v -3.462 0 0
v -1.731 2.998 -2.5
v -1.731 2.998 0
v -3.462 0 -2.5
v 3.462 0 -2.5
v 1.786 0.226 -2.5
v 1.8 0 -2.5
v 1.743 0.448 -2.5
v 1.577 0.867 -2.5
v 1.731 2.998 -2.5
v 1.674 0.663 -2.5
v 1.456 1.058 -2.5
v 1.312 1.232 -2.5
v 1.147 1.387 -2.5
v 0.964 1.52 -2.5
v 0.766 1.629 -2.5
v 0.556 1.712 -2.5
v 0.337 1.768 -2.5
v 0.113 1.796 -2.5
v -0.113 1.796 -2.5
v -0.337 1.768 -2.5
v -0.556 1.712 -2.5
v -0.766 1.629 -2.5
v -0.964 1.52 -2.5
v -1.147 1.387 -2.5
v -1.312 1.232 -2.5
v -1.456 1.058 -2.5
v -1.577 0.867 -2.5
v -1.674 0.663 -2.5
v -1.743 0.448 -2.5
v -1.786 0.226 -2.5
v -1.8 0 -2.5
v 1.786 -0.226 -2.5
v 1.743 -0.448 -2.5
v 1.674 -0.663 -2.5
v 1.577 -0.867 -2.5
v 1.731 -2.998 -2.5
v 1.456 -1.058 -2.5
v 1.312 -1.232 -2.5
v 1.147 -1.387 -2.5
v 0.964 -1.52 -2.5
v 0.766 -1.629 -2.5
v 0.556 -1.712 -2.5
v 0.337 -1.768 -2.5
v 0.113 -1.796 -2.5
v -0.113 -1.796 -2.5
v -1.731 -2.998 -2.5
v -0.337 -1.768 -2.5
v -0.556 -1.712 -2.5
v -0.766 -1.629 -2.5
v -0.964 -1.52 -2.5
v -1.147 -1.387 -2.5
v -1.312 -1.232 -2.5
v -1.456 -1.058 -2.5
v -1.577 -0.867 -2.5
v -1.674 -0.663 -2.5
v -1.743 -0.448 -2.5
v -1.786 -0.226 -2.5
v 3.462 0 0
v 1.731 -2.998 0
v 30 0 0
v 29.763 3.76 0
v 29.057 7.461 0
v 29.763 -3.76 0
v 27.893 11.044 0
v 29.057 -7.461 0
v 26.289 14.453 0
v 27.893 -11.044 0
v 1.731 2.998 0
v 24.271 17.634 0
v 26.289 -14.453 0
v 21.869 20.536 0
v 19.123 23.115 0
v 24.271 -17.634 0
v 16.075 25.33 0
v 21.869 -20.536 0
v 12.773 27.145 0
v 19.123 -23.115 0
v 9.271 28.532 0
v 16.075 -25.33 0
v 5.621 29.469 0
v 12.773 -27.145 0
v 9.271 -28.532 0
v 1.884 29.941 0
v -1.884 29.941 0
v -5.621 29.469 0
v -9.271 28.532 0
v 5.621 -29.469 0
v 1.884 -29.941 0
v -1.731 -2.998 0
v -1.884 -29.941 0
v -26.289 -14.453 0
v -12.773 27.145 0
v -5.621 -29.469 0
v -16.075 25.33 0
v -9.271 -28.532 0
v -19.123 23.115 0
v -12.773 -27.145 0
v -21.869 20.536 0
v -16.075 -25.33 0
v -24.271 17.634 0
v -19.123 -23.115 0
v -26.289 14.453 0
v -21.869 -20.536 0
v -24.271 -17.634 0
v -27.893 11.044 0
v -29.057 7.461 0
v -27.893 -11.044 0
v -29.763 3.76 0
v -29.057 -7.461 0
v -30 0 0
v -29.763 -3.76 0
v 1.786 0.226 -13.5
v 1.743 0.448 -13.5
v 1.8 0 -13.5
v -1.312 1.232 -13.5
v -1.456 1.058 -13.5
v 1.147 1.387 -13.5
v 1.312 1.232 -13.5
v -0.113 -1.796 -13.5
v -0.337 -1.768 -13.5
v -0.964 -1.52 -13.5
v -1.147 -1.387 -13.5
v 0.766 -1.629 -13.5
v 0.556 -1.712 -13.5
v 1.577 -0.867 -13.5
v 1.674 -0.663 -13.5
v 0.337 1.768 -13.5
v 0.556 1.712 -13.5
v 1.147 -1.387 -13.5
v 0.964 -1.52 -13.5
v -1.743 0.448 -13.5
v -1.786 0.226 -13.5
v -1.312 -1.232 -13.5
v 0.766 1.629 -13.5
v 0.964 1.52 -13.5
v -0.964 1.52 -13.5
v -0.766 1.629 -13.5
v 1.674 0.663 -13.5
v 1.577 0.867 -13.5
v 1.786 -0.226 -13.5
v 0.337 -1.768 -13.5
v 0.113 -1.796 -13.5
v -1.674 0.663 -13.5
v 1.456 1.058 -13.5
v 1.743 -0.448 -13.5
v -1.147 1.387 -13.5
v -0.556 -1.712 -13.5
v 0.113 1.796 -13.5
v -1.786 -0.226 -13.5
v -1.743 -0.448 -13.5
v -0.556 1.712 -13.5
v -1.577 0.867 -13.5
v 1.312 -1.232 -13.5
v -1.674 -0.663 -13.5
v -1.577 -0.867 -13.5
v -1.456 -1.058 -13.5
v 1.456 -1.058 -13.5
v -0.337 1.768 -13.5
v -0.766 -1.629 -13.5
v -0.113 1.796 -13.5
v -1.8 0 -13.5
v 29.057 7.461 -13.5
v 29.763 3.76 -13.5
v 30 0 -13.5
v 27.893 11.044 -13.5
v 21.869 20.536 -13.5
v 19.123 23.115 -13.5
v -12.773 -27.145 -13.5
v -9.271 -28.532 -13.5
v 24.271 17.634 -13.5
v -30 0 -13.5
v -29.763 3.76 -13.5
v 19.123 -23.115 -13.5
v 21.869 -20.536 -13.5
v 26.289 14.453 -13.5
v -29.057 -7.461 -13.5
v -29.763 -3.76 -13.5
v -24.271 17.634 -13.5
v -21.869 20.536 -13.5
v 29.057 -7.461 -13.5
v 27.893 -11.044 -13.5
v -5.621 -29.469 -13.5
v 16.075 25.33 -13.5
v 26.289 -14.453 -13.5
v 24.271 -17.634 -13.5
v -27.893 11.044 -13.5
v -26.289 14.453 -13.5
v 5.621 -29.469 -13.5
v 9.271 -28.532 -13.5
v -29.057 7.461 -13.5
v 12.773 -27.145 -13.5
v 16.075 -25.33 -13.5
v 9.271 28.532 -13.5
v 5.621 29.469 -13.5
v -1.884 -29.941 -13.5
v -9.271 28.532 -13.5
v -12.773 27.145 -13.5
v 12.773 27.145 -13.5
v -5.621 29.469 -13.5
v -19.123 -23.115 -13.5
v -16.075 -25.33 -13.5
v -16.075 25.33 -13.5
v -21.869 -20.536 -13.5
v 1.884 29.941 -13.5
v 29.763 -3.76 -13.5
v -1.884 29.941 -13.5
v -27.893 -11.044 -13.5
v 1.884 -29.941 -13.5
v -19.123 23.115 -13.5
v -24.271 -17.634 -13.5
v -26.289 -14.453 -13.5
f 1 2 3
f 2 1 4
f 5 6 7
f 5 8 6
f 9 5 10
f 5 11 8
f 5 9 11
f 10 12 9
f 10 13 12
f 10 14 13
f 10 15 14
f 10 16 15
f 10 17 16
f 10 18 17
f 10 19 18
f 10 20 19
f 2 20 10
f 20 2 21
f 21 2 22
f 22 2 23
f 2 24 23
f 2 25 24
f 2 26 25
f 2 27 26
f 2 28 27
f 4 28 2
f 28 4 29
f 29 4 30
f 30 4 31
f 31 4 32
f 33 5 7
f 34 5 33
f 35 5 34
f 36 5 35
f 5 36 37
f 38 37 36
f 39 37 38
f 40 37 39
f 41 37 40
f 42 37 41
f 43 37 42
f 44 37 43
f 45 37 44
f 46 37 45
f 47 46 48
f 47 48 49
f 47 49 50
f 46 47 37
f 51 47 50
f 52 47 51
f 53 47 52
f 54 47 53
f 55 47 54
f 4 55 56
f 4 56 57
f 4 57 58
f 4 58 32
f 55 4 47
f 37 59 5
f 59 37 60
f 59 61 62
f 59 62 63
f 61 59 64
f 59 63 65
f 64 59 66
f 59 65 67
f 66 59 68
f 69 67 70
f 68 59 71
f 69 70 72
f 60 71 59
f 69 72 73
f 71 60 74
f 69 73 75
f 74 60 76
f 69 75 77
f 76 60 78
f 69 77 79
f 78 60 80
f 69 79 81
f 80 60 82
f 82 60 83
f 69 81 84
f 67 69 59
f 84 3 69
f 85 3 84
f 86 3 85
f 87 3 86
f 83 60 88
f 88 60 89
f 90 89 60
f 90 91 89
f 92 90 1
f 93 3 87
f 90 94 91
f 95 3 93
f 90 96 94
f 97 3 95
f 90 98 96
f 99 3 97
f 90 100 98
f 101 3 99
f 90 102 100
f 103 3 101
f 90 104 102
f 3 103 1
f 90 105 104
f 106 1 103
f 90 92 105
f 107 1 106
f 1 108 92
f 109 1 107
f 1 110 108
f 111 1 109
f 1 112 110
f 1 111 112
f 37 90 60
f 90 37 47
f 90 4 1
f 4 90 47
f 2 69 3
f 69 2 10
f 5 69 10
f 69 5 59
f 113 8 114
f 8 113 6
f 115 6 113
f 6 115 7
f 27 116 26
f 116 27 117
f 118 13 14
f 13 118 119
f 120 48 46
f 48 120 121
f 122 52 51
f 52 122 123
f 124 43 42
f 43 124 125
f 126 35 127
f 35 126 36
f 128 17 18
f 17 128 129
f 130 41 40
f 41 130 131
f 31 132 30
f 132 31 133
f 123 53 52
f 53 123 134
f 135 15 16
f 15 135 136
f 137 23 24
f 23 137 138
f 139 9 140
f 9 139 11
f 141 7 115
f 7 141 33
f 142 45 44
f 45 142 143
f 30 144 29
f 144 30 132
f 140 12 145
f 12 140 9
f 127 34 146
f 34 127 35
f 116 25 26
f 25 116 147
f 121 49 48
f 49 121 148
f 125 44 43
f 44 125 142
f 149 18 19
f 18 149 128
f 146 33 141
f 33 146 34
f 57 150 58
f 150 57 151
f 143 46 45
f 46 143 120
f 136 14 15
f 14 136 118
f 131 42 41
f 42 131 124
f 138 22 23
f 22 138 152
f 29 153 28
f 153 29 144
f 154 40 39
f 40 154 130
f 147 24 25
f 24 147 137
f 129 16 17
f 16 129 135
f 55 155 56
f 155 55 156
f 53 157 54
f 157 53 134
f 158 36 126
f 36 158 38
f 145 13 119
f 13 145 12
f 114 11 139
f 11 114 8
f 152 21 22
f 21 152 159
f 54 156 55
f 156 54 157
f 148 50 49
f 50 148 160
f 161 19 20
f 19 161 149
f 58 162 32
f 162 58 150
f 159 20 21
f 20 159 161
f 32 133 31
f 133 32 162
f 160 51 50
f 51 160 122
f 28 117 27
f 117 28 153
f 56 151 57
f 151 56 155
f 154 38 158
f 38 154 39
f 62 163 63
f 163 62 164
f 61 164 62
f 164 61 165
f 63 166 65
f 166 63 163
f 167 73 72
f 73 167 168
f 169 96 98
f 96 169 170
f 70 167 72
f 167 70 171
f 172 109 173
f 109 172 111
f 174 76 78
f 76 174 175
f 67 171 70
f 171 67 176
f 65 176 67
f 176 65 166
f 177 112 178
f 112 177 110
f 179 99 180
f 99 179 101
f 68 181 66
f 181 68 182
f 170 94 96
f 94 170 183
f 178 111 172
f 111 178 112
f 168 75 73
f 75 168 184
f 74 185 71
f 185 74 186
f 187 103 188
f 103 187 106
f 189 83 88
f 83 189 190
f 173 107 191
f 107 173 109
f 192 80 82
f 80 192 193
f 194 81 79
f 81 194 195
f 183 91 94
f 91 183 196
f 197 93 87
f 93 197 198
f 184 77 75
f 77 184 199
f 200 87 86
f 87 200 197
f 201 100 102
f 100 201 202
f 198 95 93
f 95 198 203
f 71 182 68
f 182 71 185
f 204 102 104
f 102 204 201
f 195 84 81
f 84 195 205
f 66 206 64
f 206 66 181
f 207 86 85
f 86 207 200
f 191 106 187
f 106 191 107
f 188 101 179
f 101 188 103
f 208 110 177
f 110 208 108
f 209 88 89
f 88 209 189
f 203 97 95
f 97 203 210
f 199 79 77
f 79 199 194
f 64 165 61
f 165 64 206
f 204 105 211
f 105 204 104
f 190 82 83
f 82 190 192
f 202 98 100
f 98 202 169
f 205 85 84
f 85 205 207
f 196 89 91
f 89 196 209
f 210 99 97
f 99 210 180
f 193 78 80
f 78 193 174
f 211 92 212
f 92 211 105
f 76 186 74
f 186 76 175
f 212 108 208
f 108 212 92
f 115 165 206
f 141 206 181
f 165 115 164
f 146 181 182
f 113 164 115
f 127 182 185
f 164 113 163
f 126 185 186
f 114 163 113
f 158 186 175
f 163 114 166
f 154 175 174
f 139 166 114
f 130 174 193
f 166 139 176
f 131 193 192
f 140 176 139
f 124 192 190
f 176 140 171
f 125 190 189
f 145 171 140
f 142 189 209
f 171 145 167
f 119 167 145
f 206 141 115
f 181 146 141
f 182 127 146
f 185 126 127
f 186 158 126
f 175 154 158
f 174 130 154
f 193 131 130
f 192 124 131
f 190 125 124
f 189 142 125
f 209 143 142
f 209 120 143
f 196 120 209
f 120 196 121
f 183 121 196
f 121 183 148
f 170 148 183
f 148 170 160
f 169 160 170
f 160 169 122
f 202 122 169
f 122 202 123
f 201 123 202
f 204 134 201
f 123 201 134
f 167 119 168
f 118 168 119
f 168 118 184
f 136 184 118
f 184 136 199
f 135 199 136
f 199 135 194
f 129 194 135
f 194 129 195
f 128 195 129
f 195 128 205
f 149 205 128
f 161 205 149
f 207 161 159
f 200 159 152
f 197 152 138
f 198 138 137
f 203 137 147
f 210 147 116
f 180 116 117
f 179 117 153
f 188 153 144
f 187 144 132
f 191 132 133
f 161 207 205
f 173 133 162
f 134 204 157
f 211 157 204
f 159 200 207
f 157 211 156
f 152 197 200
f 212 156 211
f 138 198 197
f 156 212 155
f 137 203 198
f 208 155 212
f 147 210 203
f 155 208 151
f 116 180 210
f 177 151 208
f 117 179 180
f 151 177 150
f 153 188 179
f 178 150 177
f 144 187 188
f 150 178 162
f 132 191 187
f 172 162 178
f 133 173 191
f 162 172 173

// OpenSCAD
$fn = 50;


difference() {
	union() {
		translate(v = [0, 0, -13.5000000000]) {
			cylinder(h = 13.5000000000, r = 30.0000000000);
		}
	}
	union() {
		translate(v = [0, 0, 0]) {
			rotate(a = [0, 0, 0]) {
				difference() {
					union() {
						translate(v = [0, 0, -2.5000000000]) {
							linear_extrude(height = 2.5000000000) {
								polygon(points = [[3.4620000000, 0.0000000000], [1.7310000000, 2.9981799479], [-1.7310000000, 2.9981799479], [-3.4620000000, 0.0000000000], [-1.7310000000, -2.9981799479], [1.7310000000, -2.9981799479]]);
							}
						}
					}
					union();
				}
			}
		}
		#translate(v = [0, 0, -100.0000000000]) {
			cylinder(h = 200, r = 1.8000000000);
		}
	}
}
